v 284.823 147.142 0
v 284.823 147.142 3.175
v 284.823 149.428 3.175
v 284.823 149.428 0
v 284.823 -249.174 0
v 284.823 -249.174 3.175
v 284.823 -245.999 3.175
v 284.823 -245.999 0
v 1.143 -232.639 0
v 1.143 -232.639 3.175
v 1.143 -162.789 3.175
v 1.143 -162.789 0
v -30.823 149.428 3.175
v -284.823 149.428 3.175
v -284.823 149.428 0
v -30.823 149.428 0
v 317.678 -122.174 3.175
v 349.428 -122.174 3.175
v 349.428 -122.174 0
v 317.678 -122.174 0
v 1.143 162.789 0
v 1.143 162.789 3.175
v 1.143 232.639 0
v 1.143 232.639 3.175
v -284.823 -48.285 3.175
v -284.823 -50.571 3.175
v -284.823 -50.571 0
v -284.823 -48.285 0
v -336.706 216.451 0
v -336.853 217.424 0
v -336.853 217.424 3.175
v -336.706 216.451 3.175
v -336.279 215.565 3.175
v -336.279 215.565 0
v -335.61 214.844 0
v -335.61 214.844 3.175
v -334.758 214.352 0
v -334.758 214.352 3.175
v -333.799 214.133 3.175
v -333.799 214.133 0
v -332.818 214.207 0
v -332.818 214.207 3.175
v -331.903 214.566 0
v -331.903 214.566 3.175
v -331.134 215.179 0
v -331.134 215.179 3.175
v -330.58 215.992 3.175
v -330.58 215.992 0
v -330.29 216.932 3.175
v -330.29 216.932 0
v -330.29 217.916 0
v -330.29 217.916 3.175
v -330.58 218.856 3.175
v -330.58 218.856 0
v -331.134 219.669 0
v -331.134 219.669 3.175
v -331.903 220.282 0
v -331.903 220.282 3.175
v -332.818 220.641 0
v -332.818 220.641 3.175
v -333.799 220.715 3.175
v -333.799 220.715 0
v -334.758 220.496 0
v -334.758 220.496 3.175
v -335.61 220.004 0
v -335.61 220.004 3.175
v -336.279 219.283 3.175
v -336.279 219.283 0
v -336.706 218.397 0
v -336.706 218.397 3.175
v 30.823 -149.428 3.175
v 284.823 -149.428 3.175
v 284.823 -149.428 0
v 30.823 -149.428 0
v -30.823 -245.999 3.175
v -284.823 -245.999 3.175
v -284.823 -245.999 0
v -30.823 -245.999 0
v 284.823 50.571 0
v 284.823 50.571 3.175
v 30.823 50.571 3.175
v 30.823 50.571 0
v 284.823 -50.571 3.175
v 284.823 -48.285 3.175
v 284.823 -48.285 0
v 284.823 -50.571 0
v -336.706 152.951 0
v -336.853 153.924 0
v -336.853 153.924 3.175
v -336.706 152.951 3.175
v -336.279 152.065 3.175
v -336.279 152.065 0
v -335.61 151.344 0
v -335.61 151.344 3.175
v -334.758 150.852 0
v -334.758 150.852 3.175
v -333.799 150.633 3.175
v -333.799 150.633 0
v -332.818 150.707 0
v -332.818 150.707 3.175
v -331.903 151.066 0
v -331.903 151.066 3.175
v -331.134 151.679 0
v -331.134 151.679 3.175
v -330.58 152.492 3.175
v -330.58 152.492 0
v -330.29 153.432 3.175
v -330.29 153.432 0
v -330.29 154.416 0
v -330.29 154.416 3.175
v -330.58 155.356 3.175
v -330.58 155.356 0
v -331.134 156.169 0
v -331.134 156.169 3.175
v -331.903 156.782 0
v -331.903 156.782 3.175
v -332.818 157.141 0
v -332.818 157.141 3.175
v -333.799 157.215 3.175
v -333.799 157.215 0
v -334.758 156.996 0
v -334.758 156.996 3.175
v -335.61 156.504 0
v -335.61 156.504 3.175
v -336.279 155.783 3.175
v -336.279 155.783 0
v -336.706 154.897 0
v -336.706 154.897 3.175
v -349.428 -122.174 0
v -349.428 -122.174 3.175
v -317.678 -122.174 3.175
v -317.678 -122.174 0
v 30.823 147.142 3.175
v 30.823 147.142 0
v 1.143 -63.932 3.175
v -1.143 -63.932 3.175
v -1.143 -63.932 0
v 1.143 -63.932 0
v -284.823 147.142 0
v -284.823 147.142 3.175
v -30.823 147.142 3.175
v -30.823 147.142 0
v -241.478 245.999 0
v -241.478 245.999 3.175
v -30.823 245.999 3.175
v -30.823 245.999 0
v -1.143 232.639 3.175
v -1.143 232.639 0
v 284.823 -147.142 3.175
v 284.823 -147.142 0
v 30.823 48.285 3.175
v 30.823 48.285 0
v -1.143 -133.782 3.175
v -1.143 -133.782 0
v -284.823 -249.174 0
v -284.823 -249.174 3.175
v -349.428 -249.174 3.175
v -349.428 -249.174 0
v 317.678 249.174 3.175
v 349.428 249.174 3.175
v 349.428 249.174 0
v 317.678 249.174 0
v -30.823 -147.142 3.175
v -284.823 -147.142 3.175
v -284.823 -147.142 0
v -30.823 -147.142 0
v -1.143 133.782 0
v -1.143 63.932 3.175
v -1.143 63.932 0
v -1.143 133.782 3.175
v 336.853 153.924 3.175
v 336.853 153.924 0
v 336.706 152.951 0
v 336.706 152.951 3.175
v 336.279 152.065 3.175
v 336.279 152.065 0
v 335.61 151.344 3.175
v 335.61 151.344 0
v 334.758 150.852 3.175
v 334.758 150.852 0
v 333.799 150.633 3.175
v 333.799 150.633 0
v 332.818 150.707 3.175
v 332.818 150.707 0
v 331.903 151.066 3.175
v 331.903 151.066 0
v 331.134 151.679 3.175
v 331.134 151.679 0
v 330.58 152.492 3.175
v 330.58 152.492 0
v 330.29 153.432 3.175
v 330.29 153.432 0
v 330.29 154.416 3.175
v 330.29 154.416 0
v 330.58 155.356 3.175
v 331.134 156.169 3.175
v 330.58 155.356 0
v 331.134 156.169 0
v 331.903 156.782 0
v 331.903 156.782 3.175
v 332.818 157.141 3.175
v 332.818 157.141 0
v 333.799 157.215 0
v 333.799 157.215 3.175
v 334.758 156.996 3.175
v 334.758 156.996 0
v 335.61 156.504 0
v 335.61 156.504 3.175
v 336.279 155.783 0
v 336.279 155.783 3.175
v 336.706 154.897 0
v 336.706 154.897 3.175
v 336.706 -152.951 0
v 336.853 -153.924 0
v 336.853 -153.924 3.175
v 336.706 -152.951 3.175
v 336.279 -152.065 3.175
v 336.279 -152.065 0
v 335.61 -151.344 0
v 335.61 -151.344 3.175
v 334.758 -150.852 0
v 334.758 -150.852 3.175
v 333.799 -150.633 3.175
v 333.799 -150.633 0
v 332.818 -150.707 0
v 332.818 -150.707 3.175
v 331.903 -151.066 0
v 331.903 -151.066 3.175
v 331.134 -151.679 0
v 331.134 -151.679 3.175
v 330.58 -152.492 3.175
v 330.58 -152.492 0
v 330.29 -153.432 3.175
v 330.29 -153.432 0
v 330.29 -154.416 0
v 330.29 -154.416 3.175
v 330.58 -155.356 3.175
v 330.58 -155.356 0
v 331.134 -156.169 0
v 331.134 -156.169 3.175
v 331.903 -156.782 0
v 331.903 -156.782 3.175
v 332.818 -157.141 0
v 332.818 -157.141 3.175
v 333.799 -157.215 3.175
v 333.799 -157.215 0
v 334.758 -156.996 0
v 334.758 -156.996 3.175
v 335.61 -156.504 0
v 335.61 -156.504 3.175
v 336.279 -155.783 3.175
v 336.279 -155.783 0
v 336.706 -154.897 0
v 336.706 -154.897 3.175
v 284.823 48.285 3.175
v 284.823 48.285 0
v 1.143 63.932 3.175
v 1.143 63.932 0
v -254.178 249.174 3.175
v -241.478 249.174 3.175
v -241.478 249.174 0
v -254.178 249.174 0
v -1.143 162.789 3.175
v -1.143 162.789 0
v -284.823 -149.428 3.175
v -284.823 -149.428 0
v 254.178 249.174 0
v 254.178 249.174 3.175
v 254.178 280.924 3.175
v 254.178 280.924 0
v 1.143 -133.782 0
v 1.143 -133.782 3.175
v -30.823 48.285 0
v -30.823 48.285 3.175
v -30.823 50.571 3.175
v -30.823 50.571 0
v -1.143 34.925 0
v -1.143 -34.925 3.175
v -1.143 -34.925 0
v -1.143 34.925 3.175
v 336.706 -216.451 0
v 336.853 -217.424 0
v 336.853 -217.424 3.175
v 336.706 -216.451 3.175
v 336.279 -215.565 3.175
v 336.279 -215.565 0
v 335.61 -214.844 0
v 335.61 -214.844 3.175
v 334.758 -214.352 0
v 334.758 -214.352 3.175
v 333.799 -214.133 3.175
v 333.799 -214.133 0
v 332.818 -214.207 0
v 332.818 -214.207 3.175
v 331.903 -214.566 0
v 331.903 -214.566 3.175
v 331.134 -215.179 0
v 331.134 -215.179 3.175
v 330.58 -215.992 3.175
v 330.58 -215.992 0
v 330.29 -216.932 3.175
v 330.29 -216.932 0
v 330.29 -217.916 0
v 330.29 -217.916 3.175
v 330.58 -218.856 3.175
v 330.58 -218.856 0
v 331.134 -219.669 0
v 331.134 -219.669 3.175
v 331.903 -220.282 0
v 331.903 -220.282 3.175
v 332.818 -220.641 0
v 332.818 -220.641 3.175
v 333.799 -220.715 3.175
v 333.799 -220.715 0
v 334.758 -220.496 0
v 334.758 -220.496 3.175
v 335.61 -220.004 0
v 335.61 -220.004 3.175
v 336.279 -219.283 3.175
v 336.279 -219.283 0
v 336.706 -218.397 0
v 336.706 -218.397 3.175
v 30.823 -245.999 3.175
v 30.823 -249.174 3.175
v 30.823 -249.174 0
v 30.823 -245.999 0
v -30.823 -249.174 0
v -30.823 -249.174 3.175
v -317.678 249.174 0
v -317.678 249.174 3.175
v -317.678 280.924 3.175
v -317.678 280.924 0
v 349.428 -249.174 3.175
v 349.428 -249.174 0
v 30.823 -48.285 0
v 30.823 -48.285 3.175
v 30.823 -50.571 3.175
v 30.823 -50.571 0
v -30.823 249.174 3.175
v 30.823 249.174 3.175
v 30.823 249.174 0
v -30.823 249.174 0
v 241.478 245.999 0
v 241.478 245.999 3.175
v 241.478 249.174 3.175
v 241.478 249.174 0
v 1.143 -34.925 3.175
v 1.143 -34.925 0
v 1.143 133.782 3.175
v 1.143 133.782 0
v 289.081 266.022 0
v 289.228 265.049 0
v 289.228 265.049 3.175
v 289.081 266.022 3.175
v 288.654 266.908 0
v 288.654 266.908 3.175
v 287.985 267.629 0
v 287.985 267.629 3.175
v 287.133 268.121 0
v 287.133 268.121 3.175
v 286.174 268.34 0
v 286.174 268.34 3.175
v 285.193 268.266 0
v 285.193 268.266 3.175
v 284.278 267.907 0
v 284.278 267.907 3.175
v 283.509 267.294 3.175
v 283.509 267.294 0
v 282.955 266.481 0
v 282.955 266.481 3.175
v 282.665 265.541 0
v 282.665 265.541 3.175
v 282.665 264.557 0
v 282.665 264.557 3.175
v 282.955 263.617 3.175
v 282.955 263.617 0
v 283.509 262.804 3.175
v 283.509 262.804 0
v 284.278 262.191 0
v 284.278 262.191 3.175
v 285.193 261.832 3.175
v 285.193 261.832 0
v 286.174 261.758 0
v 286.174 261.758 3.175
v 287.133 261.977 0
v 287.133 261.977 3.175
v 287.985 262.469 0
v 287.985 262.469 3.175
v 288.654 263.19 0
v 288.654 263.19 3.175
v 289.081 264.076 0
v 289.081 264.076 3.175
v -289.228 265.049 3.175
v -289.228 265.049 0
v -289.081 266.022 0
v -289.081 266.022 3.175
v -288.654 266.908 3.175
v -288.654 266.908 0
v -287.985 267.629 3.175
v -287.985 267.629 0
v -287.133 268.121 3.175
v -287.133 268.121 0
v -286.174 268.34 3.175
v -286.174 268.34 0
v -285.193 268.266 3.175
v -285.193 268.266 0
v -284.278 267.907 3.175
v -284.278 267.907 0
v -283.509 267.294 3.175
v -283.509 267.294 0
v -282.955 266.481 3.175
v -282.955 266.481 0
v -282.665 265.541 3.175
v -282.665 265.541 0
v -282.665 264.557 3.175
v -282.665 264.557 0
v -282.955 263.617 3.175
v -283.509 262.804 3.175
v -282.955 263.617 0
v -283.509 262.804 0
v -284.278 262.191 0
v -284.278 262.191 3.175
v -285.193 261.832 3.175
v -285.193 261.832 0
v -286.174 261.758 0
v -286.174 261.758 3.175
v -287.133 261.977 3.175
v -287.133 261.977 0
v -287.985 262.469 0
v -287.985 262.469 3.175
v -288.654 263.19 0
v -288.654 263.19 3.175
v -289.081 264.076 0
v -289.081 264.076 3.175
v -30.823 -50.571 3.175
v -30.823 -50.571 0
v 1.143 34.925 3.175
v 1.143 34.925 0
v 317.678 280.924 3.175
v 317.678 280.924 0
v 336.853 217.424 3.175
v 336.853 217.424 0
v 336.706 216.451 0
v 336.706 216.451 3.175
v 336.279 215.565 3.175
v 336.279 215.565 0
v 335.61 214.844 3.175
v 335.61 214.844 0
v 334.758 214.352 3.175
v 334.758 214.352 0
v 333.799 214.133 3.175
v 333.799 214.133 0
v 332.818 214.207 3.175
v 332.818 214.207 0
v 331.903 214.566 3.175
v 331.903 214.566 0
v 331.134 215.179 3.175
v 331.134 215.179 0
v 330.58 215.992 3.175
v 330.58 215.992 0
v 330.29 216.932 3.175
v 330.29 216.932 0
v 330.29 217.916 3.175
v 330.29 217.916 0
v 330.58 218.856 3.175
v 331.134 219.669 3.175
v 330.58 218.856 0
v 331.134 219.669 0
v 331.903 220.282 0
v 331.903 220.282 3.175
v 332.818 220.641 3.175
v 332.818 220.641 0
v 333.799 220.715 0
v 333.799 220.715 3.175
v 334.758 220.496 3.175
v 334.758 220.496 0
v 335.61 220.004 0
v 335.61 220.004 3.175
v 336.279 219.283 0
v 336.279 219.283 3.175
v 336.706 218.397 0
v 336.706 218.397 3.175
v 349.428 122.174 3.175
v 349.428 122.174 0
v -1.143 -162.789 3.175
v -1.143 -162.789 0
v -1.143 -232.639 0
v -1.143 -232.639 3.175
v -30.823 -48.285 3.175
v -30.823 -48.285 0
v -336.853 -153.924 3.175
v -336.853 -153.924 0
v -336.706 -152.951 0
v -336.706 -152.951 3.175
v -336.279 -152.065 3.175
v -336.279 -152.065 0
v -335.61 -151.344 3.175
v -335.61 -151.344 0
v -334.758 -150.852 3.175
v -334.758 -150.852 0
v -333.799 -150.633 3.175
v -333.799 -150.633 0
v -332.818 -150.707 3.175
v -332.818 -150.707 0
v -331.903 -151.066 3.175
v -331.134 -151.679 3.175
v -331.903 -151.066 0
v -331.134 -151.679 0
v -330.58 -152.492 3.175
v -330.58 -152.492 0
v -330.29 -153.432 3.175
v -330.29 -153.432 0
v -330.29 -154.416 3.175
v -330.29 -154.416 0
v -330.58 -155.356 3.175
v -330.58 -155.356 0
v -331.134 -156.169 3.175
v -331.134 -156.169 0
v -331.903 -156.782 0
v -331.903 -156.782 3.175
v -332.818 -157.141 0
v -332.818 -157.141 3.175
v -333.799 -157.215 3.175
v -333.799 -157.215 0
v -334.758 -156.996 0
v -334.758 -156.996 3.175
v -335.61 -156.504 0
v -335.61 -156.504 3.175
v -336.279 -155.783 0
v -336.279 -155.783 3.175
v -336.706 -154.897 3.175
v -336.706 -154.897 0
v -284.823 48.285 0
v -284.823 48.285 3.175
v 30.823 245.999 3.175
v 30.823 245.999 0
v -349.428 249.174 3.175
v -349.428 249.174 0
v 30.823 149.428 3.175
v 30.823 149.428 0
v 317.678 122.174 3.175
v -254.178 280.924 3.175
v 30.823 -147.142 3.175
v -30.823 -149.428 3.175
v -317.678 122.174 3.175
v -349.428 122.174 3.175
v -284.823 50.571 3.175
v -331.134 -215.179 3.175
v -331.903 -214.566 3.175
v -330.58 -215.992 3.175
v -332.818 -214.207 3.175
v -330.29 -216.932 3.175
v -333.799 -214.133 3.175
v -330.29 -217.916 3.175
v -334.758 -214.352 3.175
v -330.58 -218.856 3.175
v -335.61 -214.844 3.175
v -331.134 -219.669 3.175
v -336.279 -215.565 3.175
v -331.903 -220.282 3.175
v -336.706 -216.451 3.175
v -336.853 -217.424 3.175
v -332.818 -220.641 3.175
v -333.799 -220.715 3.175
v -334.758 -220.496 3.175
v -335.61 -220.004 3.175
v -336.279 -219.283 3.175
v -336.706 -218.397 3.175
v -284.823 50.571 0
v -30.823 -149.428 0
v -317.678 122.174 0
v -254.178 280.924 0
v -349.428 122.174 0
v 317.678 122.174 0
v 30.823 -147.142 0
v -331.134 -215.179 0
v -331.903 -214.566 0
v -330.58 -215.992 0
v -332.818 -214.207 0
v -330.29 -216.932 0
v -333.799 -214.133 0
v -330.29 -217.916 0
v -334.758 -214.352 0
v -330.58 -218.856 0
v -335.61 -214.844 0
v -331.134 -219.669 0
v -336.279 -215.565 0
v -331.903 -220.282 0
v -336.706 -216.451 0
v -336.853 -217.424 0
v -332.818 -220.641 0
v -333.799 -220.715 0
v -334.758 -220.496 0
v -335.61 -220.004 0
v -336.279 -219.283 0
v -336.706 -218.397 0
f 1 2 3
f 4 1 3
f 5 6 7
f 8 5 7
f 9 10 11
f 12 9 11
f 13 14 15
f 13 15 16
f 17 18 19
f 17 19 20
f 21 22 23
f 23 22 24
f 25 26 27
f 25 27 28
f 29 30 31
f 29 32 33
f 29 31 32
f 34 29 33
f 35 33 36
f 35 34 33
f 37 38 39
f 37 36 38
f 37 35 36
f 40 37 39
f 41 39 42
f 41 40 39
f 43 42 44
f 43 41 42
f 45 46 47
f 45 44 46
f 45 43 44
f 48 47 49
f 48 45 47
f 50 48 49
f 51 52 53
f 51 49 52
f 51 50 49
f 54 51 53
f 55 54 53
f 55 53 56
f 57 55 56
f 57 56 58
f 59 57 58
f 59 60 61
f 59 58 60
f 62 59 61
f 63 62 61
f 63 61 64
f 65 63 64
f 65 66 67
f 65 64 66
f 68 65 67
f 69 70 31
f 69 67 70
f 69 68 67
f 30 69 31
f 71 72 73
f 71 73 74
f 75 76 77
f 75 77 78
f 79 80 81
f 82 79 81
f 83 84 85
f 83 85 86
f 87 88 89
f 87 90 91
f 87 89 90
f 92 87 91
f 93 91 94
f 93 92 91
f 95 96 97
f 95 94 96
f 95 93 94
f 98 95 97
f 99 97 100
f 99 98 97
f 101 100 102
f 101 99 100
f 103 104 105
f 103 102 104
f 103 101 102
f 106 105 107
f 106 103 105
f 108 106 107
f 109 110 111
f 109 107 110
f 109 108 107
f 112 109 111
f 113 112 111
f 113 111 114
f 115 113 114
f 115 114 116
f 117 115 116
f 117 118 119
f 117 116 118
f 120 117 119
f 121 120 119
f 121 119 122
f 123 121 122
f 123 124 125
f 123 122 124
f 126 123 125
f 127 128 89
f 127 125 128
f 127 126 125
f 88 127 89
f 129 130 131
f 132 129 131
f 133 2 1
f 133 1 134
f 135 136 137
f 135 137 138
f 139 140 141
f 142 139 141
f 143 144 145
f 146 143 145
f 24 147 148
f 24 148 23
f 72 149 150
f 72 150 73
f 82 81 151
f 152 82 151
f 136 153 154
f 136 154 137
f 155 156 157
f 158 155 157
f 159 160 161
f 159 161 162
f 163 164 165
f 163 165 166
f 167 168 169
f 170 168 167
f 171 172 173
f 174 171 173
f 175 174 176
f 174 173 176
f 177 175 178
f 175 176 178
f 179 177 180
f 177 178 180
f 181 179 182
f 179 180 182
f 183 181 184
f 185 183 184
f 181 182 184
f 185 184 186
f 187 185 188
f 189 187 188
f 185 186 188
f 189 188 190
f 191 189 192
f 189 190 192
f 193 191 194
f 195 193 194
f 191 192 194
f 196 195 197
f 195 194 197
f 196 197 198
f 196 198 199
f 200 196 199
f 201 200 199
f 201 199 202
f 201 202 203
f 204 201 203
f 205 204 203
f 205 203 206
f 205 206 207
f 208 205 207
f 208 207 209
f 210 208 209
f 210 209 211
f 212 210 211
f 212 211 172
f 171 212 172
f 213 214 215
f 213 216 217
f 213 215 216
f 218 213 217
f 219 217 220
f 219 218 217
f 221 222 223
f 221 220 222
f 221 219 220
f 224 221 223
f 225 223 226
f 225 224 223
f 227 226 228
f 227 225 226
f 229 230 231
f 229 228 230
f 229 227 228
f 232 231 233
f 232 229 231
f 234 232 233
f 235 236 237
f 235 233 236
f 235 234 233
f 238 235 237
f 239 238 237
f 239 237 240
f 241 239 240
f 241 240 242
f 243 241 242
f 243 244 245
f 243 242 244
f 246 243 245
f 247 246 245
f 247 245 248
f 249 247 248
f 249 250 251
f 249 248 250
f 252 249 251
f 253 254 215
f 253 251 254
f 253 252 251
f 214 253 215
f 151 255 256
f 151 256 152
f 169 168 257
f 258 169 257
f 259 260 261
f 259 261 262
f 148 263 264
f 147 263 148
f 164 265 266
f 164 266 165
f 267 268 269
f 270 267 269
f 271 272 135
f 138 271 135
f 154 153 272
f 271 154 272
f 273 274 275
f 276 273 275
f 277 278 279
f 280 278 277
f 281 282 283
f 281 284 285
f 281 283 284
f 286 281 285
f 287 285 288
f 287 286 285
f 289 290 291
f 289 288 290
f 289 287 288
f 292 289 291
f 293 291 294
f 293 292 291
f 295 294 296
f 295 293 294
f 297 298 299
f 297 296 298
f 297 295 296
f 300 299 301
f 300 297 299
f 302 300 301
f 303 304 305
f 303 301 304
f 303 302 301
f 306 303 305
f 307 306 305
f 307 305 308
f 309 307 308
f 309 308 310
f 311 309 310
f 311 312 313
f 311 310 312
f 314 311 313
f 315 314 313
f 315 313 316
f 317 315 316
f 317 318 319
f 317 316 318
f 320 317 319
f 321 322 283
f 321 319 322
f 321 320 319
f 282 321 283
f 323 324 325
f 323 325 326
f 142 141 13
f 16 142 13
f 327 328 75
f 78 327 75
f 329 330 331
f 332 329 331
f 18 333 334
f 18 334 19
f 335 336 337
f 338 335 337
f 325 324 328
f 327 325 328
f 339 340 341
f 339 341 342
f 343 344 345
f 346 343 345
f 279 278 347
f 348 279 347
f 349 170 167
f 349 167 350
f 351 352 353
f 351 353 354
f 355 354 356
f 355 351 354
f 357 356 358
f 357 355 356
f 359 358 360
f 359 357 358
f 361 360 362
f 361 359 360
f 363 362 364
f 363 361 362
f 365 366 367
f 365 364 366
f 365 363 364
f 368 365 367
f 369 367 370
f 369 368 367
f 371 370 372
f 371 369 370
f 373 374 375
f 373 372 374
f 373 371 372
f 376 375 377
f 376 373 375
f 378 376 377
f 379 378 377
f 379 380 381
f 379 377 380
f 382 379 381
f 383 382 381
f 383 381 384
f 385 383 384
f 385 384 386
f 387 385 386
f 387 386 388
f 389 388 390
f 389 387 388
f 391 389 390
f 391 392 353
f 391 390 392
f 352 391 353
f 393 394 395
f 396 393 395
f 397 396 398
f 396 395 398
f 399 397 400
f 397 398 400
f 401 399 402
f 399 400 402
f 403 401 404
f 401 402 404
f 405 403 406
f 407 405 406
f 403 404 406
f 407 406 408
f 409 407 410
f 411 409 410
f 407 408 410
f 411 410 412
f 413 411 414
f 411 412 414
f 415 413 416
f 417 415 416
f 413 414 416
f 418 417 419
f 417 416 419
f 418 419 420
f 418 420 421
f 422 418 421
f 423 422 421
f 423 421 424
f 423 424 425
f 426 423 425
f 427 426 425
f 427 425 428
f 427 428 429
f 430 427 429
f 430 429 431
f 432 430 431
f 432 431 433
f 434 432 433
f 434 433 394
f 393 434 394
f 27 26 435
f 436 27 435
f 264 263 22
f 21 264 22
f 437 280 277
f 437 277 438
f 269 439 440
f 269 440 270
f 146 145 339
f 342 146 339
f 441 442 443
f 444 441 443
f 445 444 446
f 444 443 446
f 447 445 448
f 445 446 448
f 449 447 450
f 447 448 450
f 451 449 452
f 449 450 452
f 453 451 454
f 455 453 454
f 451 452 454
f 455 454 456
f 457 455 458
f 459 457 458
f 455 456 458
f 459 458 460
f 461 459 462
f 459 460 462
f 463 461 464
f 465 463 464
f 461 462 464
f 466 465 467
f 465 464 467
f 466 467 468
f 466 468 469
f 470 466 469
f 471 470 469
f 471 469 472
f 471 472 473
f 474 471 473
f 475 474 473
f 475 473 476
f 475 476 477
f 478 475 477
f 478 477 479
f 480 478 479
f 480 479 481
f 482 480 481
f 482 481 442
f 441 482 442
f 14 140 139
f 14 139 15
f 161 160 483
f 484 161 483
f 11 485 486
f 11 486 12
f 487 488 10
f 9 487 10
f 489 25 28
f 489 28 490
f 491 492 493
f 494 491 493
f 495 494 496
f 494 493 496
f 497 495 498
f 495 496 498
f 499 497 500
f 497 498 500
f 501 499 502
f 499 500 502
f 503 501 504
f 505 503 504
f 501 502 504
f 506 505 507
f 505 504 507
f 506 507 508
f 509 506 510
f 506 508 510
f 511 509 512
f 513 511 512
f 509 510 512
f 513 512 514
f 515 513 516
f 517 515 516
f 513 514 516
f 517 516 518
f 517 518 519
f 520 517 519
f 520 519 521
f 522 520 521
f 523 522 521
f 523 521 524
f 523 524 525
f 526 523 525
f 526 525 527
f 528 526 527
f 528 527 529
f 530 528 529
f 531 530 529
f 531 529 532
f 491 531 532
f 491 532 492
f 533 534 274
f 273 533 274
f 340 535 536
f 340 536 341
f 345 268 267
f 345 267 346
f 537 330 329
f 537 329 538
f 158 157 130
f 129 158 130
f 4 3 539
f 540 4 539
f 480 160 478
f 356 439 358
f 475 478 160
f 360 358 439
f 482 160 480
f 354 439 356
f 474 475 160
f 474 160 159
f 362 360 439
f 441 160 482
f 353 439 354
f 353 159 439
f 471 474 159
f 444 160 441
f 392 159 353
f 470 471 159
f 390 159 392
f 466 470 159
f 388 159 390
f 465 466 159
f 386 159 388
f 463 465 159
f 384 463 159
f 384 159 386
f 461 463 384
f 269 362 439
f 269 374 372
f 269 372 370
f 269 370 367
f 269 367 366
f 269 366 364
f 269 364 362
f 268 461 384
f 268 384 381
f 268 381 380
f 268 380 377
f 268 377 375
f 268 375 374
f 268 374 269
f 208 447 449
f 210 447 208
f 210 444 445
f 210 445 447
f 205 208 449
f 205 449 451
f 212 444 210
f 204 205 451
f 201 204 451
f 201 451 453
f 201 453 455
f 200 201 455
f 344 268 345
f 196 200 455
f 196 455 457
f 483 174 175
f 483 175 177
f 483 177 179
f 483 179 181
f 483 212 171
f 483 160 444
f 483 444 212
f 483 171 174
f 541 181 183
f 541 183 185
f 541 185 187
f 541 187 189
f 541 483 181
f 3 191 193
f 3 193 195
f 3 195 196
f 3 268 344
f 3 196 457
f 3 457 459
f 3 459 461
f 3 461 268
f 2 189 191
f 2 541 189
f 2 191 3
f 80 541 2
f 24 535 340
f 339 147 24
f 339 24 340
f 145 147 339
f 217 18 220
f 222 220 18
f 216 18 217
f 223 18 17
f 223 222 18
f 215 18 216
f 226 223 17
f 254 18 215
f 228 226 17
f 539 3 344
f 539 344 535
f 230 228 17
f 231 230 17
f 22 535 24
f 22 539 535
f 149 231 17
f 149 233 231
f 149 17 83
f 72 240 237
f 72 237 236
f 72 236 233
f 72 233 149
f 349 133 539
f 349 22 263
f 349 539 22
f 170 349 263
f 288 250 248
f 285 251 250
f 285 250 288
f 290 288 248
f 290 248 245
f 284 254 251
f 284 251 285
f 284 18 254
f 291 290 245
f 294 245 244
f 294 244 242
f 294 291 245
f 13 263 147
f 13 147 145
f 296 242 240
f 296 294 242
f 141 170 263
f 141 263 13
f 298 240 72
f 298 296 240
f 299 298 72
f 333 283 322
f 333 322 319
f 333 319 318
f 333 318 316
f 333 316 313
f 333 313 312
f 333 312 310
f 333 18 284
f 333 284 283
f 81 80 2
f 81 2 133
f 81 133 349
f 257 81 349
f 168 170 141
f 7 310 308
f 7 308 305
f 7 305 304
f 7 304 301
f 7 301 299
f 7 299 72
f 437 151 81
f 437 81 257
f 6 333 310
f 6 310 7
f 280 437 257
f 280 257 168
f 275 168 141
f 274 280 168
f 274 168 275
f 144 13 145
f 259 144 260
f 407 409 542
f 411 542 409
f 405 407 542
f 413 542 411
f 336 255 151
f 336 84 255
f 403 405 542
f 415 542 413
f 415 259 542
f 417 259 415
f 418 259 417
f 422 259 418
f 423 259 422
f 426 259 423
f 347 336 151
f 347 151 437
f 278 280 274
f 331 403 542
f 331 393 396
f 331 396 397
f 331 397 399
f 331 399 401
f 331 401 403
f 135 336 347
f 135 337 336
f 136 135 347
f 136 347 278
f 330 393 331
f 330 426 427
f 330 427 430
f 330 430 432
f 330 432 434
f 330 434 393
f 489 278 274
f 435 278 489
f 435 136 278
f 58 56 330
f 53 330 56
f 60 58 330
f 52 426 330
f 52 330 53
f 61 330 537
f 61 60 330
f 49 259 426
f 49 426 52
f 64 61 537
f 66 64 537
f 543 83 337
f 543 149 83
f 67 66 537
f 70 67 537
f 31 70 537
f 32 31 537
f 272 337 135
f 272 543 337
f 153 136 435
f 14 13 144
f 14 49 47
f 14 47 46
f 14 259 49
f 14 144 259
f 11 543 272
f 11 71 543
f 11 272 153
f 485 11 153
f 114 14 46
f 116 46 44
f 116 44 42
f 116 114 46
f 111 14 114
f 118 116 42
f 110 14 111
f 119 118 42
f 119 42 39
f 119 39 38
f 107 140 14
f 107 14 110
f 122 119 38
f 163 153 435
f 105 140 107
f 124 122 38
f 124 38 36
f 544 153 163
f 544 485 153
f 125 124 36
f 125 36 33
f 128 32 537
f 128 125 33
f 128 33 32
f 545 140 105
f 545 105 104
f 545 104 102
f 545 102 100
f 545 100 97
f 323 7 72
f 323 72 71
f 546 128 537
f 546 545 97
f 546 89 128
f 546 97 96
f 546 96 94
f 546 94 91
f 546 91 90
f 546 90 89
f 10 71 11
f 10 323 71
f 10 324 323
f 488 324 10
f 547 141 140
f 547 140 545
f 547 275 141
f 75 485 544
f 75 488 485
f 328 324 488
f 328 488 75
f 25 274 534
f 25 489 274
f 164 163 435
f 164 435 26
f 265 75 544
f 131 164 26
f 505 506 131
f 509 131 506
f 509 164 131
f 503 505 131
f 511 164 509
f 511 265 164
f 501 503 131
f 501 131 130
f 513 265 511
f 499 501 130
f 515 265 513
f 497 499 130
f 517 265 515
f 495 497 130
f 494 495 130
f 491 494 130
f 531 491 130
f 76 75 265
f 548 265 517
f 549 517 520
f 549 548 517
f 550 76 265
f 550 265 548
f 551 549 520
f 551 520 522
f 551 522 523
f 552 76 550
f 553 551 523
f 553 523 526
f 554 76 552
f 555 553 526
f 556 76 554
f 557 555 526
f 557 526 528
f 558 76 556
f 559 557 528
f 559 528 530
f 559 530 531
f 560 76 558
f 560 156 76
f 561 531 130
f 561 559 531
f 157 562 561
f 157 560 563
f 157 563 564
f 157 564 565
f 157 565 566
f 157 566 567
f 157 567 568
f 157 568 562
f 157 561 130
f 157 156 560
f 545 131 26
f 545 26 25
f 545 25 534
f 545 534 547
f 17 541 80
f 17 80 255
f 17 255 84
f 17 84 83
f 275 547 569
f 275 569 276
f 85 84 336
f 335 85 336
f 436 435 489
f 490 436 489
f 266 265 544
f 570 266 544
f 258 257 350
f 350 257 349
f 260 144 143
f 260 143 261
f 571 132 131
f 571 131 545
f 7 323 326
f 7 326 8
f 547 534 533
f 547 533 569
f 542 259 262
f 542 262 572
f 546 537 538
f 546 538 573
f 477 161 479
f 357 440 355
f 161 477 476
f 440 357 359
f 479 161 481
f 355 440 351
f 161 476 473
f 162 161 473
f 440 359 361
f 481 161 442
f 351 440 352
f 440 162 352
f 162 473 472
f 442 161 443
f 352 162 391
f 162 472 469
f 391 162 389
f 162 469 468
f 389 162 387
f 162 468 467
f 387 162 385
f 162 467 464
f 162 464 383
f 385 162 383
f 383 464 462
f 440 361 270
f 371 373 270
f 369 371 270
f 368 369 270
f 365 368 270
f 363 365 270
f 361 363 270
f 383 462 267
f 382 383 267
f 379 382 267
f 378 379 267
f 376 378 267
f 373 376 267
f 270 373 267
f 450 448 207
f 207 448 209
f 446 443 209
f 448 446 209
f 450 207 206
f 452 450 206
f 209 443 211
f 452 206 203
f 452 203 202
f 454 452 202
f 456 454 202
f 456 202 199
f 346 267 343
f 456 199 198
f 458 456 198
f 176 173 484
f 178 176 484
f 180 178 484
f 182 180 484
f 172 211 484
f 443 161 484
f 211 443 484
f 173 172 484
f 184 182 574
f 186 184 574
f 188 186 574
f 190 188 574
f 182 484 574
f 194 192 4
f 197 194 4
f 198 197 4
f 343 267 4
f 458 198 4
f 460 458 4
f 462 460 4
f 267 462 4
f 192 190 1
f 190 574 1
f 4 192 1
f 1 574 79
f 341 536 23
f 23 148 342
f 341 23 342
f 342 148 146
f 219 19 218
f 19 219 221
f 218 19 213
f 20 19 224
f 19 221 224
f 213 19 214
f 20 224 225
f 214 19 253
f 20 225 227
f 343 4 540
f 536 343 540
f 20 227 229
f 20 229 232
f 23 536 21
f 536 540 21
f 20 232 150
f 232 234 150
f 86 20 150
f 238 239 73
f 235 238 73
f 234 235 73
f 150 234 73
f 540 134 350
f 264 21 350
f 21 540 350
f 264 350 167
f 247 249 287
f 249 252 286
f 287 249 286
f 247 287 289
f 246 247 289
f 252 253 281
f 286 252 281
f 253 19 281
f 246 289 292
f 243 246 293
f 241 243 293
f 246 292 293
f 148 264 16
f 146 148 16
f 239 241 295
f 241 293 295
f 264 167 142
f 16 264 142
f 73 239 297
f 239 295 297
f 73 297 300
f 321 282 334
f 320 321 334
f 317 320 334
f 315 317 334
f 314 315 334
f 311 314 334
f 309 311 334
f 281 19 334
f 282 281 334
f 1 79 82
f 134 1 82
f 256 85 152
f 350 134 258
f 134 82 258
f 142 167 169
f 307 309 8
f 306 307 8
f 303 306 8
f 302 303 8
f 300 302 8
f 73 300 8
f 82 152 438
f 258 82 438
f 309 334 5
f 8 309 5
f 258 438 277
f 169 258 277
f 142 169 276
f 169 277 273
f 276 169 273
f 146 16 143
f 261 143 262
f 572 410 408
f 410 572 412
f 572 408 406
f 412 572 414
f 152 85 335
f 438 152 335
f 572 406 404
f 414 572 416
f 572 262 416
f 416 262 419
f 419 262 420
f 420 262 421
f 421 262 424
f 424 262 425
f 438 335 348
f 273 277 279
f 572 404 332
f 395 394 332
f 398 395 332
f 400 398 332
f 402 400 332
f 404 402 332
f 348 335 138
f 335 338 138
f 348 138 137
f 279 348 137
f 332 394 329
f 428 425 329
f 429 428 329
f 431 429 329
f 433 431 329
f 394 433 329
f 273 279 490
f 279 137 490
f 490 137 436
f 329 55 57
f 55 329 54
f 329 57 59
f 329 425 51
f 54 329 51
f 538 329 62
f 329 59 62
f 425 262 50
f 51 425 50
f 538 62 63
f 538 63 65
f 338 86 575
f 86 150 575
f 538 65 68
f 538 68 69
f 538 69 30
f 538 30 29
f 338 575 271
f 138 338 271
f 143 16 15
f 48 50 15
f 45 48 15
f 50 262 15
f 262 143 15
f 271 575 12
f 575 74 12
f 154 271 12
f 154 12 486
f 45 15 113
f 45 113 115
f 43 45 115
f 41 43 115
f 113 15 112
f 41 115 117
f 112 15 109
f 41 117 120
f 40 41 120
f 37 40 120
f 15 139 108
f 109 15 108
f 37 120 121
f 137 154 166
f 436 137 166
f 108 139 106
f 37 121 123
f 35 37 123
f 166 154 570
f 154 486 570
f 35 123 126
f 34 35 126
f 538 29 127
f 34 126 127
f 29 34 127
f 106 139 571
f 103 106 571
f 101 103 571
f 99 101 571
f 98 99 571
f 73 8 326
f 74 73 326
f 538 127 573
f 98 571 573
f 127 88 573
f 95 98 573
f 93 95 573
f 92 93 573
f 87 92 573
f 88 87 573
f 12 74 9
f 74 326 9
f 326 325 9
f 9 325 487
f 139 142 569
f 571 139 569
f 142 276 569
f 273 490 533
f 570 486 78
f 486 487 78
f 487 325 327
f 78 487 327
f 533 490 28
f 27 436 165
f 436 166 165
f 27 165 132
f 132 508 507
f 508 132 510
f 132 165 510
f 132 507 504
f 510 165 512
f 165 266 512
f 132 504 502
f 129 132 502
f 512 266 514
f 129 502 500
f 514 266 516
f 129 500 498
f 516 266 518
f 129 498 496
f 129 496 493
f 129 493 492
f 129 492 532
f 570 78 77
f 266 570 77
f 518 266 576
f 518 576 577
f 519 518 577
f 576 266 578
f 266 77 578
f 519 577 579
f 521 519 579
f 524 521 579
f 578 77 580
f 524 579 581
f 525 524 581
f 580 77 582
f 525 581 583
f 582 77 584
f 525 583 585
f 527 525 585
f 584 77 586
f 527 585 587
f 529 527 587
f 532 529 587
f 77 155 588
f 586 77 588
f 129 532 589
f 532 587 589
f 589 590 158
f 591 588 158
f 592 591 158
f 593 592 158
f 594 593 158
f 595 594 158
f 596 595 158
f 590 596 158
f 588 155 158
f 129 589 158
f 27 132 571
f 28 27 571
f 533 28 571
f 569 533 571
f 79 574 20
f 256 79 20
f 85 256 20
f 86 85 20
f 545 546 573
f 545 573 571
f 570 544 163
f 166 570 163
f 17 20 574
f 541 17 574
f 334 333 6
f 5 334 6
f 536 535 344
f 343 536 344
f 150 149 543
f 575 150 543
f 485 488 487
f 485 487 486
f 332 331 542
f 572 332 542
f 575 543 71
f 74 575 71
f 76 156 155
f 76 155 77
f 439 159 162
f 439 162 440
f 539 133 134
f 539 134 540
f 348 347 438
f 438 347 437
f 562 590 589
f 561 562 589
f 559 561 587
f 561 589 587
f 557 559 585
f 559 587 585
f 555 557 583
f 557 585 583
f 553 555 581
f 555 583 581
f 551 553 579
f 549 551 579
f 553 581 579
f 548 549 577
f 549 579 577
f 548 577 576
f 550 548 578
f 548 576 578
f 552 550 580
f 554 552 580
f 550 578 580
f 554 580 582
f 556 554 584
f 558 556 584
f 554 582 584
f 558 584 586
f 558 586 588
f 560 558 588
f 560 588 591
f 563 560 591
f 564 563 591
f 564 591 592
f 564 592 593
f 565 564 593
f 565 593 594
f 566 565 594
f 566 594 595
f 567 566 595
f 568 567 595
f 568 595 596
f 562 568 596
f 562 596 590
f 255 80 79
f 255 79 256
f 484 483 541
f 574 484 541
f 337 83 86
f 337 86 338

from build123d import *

# Parameters (mm, degrees)
MASTER_SKETCH_W         = 635.3556
MASTER_SKETCH_H         = 498.348
BOSS_EXTRUDE1_DEPTH     = 3.175
SKETCH2_W               = 31.75
SKETCH2_H               = 127
BOSS_EXTRUDE2_DEPTH     = 3.175
M6_CLEARANCE_HOLE1_D    = 6.6
MIRROR7_COPY_1_SKETCH_W = 31.75
MIRROR7_COPY_1_SKETCH_H = 127
MIRROR7_COPY_1_DEPTH    = 3.175
MIRROR7_COPY_2_D        = 6.6
SKETCH5_W               = 2.286
SKETCH5_H               = 69.85
CUT_EXTRUDE1_DEPTH      = 430.182420788
LPATTERN1_COUNT         = 5
LPATTERN1_PITCH         = 98.8568
SKETCH7_W               = 254
SKETCH7_H               = 2.286
CUT_EXTRUDE3_DEPTH      = 430.182420788
LPATTERN2_COUNT         = 4
LPATTERN2_PITCH         = 98.8568
MIRROR4_COPY_1_SKETCH_W = 254
MIRROR4_COPY_1_SKETCH_H = 2.286
MIRROR4_COPY_1_DEPTH    = 430.182420788
MIRROR4_COPY_2_SKETCH_W = 254
MIRROR4_COPY_2_SKETCH_H = 2.286
MIRROR4_COPY_2_DEPTH    = 430.182420788
MIRROR4_COPY_3_SKETCH_W = 254
MIRROR4_COPY_3_SKETCH_H = 2.286
MIRROR4_COPY_3_DEPTH    = 430.182420788
SKETCH10_W              = 63.5
SKETCH10_H              = 31.75
SKETCH10_R              = 3
BOSS_EXTRUDE3_DEPTH     = 3.175
M6_CLEARANCE_HOLE2_D    = 6.6
SKETCH6_W               = 254
SKETCH6_H               = 3.175
SKETCH6_W_2             = 210.6549
CUT_EXTRUDE2_DEPTH      = 449.361641774


with BuildPart() as part:
    # Master Sketch → Boss-Extrude1 (new body)
    with BuildSketch(Plane.XY):
        Rectangle(MASTER_SKETCH_W, MASTER_SKETCH_H)
    extrude(amount=BOSS_EXTRUDE1_DEPTH)

    # Sketch2 → Boss-Extrude2 (add)
    with BuildSketch(Plane.XY.offset(3.175)):
        with Locations((-333.5528, -185.674)):
            Rectangle(SKETCH2_W, SKETCH2_H)
    boss_extrude2 = extrude(amount=-BOSS_EXTRUDE2_DEPTH)

    # M6 Clearance Hole1 (through all)
    with Locations(Plane.XY.offset(3.175)):
        with Locations((-333.5528, -217.424), (-333.5528, -153.924)):
            m6_clearance_hole1 = Hole(M6_CLEARANCE_HOLE1_D / 2)

    # Mirror1: Boss-Extrude2, M6 Clearance Hole1 across plane
    add(boss_extrude2.mirror(Plane(origin=(0, 0, 0), x_dir=(0, 0, 1), z_dir=(1, 0, 0))))
    add(m6_clearance_hole1.mirror(Plane(origin=(0, 0, 0), x_dir=(0, 0, 1), z_dir=(1, 0, 0))), mode=Mode.SUBTRACT)

    # Mirror7: Boss-Extrude2, M6 Clearance Hole1 across plane
    add(boss_extrude2.mirror(Plane.ZX))
    add(m6_clearance_hole1.mirror(Plane.ZX), mode=Mode.SUBTRACT)

    # Mirror7 copy 1 sketch → Mirror7 copy 1 (add)
    with BuildSketch(Plane(origin=(0, 0, 3.175), x_dir=(-1, 0, 0), z_dir=(0, 0, 1))):
        with Locations((-333.5528, -185.674)):
            Rectangle(MIRROR7_COPY_1_SKETCH_W, MIRROR7_COPY_1_SKETCH_H)
    extrude(amount=-MIRROR7_COPY_1_DEPTH)

    # Mirror7 copy 2 (through all)
    with Locations(Plane(origin=(0, 0, 3.175), x_dir=(-1, 0, 0), z_dir=(0, 0, 1))):
        with Locations((-333.5528, -217.424), (-333.5528, -153.924)):
            Hole(MIRROR7_COPY_2_D / 2)

    # Sketch5 → Cut-Extrude1 (cut, through all)
    with BuildSketch(Plane.XY.offset(3.175)):
        with Locations((0, 197.7136)):
            Rectangle(SKETCH5_W, SKETCH5_H)
    cut_extrude1 = extrude(amount=-CUT_EXTRUDE1_DEPTH, mode=Mode.SUBTRACT)

    # LPattern1: Cut-Extrude1 ×5
    with Locations(*[(0, -i * LPATTERN1_PITCH, 0) for i in range(1, LPATTERN1_COUNT)]):
        add(cut_extrude1, mode=Mode.SUBTRACT)

    # Sketch7 → Cut-Extrude3 (cut, through all)
    with BuildSketch(Plane.XY.offset(3.175)):
        with Locations((-157.8229, 148.2852)):
            Rectangle(SKETCH7_W, SKETCH7_H)
    cut_extrude3 = extrude(amount=-CUT_EXTRUDE3_DEPTH, mode=Mode.SUBTRACT)

    # LPattern2: Cut-Extrude3 ×4
    with Locations(*[(0, -i * LPATTERN2_PITCH, 0) for i in range(1, LPATTERN2_COUNT)]):
        add(cut_extrude3, mode=Mode.SUBTRACT)

    # Mirror4: Cut-Extrude3 across plane
    add(cut_extrude3.mirror(Plane(origin=(0, 0, 0), x_dir=(0, 0, 1), z_dir=(1, 0, 0))), mode=Mode.SUBTRACT)

    # Mirror4 copy 1 sketch → Mirror4 copy 1 (cut, through all)
    with BuildSketch(Plane(origin=(0, -98.8568, 3.175), x_dir=(-1, 0, 0), z_dir=(0, 0, 1))):
        with Locations((-157.8229, -148.2852)):
            Rectangle(MIRROR4_COPY_1_SKETCH_W, MIRROR4_COPY_1_SKETCH_H)
    extrude(amount=-MIRROR4_COPY_1_DEPTH, mode=Mode.SUBTRACT)

    # Mirror4 copy 2 sketch → Mirror4 copy 2 (cut, through all)
    with BuildSketch(Plane(origin=(0, -197.7136, 3.175), x_dir=(-1, 0, 0), z_dir=(0, 0, 1))):
        with Locations((-157.8229, -148.2852)):
            Rectangle(MIRROR4_COPY_2_SKETCH_W, MIRROR4_COPY_2_SKETCH_H)
    extrude(amount=-MIRROR4_COPY_2_DEPTH, mode=Mode.SUBTRACT)

    # Mirror4 copy 3 sketch → Mirror4 copy 3 (cut, through all)
    with BuildSketch(Plane(origin=(0, -296.5704, 3.175), x_dir=(-1, 0, 0), z_dir=(0, 0, 1))):
        with Locations((-157.8229, -148.2852)):
            Rectangle(MIRROR4_COPY_3_SKETCH_W, MIRROR4_COPY_3_SKETCH_H)
    extrude(amount=-MIRROR4_COPY_3_DEPTH, mode=Mode.SUBTRACT)

    # Sketch10 → Boss-Extrude3 (add)
    with BuildSketch(Plane.XY.offset(3.175)):
        with Locations((-285.9278, 265.049)):
            Rectangle(SKETCH10_W, SKETCH10_H)
        with Locations((-285.9278, 265.049)):
            Circle(SKETCH10_R, mode=Mode.SUBTRACT)
    boss_extrude3 = extrude(amount=-BOSS_EXTRUDE3_DEPTH)

    # M6 Clearance Hole2 (through all)
    with Locations(Plane.XY.offset(3.175)):
        with Locations((-285.9278, 265.049)):
            m6_clearance_hole2 = Hole(M6_CLEARANCE_HOLE2_D / 2)

    # Mirror6: Boss-Extrude3, M6 Clearance Hole2 across plane
    add(boss_extrude3.mirror(Plane(origin=(0, 0, 0), x_dir=(0, 0, 1), z_dir=(1, 0, 0))))
    add(m6_clearance_hole2.mirror(Plane(origin=(0, 0, 0), x_dir=(0, 0, 1), z_dir=(1, 0, 0))), mode=Mode.SUBTRACT)

    # Sketch6 → Cut-Extrude2 (cut, through all)
    with BuildSketch(Plane.XY.offset(3.175)):
        with Locations((-157.8229, -247.5865)):
            Rectangle(SKETCH6_W, SKETCH6_H)
        with Locations((157.8229, -247.5865)):
            Rectangle(SKETCH6_W, SKETCH6_H)
        with Locations((-136.15035, 247.5865)):
            Rectangle(SKETCH6_W_2, SKETCH6_H)
        with Locations((136.15035, 247.5865)):
            Rectangle(SKETCH6_W_2, SKETCH6_H)
    extrude(amount=-CUT_EXTRUDE2_DEPTH, mode=Mode.SUBTRACT)


solid = part.part
